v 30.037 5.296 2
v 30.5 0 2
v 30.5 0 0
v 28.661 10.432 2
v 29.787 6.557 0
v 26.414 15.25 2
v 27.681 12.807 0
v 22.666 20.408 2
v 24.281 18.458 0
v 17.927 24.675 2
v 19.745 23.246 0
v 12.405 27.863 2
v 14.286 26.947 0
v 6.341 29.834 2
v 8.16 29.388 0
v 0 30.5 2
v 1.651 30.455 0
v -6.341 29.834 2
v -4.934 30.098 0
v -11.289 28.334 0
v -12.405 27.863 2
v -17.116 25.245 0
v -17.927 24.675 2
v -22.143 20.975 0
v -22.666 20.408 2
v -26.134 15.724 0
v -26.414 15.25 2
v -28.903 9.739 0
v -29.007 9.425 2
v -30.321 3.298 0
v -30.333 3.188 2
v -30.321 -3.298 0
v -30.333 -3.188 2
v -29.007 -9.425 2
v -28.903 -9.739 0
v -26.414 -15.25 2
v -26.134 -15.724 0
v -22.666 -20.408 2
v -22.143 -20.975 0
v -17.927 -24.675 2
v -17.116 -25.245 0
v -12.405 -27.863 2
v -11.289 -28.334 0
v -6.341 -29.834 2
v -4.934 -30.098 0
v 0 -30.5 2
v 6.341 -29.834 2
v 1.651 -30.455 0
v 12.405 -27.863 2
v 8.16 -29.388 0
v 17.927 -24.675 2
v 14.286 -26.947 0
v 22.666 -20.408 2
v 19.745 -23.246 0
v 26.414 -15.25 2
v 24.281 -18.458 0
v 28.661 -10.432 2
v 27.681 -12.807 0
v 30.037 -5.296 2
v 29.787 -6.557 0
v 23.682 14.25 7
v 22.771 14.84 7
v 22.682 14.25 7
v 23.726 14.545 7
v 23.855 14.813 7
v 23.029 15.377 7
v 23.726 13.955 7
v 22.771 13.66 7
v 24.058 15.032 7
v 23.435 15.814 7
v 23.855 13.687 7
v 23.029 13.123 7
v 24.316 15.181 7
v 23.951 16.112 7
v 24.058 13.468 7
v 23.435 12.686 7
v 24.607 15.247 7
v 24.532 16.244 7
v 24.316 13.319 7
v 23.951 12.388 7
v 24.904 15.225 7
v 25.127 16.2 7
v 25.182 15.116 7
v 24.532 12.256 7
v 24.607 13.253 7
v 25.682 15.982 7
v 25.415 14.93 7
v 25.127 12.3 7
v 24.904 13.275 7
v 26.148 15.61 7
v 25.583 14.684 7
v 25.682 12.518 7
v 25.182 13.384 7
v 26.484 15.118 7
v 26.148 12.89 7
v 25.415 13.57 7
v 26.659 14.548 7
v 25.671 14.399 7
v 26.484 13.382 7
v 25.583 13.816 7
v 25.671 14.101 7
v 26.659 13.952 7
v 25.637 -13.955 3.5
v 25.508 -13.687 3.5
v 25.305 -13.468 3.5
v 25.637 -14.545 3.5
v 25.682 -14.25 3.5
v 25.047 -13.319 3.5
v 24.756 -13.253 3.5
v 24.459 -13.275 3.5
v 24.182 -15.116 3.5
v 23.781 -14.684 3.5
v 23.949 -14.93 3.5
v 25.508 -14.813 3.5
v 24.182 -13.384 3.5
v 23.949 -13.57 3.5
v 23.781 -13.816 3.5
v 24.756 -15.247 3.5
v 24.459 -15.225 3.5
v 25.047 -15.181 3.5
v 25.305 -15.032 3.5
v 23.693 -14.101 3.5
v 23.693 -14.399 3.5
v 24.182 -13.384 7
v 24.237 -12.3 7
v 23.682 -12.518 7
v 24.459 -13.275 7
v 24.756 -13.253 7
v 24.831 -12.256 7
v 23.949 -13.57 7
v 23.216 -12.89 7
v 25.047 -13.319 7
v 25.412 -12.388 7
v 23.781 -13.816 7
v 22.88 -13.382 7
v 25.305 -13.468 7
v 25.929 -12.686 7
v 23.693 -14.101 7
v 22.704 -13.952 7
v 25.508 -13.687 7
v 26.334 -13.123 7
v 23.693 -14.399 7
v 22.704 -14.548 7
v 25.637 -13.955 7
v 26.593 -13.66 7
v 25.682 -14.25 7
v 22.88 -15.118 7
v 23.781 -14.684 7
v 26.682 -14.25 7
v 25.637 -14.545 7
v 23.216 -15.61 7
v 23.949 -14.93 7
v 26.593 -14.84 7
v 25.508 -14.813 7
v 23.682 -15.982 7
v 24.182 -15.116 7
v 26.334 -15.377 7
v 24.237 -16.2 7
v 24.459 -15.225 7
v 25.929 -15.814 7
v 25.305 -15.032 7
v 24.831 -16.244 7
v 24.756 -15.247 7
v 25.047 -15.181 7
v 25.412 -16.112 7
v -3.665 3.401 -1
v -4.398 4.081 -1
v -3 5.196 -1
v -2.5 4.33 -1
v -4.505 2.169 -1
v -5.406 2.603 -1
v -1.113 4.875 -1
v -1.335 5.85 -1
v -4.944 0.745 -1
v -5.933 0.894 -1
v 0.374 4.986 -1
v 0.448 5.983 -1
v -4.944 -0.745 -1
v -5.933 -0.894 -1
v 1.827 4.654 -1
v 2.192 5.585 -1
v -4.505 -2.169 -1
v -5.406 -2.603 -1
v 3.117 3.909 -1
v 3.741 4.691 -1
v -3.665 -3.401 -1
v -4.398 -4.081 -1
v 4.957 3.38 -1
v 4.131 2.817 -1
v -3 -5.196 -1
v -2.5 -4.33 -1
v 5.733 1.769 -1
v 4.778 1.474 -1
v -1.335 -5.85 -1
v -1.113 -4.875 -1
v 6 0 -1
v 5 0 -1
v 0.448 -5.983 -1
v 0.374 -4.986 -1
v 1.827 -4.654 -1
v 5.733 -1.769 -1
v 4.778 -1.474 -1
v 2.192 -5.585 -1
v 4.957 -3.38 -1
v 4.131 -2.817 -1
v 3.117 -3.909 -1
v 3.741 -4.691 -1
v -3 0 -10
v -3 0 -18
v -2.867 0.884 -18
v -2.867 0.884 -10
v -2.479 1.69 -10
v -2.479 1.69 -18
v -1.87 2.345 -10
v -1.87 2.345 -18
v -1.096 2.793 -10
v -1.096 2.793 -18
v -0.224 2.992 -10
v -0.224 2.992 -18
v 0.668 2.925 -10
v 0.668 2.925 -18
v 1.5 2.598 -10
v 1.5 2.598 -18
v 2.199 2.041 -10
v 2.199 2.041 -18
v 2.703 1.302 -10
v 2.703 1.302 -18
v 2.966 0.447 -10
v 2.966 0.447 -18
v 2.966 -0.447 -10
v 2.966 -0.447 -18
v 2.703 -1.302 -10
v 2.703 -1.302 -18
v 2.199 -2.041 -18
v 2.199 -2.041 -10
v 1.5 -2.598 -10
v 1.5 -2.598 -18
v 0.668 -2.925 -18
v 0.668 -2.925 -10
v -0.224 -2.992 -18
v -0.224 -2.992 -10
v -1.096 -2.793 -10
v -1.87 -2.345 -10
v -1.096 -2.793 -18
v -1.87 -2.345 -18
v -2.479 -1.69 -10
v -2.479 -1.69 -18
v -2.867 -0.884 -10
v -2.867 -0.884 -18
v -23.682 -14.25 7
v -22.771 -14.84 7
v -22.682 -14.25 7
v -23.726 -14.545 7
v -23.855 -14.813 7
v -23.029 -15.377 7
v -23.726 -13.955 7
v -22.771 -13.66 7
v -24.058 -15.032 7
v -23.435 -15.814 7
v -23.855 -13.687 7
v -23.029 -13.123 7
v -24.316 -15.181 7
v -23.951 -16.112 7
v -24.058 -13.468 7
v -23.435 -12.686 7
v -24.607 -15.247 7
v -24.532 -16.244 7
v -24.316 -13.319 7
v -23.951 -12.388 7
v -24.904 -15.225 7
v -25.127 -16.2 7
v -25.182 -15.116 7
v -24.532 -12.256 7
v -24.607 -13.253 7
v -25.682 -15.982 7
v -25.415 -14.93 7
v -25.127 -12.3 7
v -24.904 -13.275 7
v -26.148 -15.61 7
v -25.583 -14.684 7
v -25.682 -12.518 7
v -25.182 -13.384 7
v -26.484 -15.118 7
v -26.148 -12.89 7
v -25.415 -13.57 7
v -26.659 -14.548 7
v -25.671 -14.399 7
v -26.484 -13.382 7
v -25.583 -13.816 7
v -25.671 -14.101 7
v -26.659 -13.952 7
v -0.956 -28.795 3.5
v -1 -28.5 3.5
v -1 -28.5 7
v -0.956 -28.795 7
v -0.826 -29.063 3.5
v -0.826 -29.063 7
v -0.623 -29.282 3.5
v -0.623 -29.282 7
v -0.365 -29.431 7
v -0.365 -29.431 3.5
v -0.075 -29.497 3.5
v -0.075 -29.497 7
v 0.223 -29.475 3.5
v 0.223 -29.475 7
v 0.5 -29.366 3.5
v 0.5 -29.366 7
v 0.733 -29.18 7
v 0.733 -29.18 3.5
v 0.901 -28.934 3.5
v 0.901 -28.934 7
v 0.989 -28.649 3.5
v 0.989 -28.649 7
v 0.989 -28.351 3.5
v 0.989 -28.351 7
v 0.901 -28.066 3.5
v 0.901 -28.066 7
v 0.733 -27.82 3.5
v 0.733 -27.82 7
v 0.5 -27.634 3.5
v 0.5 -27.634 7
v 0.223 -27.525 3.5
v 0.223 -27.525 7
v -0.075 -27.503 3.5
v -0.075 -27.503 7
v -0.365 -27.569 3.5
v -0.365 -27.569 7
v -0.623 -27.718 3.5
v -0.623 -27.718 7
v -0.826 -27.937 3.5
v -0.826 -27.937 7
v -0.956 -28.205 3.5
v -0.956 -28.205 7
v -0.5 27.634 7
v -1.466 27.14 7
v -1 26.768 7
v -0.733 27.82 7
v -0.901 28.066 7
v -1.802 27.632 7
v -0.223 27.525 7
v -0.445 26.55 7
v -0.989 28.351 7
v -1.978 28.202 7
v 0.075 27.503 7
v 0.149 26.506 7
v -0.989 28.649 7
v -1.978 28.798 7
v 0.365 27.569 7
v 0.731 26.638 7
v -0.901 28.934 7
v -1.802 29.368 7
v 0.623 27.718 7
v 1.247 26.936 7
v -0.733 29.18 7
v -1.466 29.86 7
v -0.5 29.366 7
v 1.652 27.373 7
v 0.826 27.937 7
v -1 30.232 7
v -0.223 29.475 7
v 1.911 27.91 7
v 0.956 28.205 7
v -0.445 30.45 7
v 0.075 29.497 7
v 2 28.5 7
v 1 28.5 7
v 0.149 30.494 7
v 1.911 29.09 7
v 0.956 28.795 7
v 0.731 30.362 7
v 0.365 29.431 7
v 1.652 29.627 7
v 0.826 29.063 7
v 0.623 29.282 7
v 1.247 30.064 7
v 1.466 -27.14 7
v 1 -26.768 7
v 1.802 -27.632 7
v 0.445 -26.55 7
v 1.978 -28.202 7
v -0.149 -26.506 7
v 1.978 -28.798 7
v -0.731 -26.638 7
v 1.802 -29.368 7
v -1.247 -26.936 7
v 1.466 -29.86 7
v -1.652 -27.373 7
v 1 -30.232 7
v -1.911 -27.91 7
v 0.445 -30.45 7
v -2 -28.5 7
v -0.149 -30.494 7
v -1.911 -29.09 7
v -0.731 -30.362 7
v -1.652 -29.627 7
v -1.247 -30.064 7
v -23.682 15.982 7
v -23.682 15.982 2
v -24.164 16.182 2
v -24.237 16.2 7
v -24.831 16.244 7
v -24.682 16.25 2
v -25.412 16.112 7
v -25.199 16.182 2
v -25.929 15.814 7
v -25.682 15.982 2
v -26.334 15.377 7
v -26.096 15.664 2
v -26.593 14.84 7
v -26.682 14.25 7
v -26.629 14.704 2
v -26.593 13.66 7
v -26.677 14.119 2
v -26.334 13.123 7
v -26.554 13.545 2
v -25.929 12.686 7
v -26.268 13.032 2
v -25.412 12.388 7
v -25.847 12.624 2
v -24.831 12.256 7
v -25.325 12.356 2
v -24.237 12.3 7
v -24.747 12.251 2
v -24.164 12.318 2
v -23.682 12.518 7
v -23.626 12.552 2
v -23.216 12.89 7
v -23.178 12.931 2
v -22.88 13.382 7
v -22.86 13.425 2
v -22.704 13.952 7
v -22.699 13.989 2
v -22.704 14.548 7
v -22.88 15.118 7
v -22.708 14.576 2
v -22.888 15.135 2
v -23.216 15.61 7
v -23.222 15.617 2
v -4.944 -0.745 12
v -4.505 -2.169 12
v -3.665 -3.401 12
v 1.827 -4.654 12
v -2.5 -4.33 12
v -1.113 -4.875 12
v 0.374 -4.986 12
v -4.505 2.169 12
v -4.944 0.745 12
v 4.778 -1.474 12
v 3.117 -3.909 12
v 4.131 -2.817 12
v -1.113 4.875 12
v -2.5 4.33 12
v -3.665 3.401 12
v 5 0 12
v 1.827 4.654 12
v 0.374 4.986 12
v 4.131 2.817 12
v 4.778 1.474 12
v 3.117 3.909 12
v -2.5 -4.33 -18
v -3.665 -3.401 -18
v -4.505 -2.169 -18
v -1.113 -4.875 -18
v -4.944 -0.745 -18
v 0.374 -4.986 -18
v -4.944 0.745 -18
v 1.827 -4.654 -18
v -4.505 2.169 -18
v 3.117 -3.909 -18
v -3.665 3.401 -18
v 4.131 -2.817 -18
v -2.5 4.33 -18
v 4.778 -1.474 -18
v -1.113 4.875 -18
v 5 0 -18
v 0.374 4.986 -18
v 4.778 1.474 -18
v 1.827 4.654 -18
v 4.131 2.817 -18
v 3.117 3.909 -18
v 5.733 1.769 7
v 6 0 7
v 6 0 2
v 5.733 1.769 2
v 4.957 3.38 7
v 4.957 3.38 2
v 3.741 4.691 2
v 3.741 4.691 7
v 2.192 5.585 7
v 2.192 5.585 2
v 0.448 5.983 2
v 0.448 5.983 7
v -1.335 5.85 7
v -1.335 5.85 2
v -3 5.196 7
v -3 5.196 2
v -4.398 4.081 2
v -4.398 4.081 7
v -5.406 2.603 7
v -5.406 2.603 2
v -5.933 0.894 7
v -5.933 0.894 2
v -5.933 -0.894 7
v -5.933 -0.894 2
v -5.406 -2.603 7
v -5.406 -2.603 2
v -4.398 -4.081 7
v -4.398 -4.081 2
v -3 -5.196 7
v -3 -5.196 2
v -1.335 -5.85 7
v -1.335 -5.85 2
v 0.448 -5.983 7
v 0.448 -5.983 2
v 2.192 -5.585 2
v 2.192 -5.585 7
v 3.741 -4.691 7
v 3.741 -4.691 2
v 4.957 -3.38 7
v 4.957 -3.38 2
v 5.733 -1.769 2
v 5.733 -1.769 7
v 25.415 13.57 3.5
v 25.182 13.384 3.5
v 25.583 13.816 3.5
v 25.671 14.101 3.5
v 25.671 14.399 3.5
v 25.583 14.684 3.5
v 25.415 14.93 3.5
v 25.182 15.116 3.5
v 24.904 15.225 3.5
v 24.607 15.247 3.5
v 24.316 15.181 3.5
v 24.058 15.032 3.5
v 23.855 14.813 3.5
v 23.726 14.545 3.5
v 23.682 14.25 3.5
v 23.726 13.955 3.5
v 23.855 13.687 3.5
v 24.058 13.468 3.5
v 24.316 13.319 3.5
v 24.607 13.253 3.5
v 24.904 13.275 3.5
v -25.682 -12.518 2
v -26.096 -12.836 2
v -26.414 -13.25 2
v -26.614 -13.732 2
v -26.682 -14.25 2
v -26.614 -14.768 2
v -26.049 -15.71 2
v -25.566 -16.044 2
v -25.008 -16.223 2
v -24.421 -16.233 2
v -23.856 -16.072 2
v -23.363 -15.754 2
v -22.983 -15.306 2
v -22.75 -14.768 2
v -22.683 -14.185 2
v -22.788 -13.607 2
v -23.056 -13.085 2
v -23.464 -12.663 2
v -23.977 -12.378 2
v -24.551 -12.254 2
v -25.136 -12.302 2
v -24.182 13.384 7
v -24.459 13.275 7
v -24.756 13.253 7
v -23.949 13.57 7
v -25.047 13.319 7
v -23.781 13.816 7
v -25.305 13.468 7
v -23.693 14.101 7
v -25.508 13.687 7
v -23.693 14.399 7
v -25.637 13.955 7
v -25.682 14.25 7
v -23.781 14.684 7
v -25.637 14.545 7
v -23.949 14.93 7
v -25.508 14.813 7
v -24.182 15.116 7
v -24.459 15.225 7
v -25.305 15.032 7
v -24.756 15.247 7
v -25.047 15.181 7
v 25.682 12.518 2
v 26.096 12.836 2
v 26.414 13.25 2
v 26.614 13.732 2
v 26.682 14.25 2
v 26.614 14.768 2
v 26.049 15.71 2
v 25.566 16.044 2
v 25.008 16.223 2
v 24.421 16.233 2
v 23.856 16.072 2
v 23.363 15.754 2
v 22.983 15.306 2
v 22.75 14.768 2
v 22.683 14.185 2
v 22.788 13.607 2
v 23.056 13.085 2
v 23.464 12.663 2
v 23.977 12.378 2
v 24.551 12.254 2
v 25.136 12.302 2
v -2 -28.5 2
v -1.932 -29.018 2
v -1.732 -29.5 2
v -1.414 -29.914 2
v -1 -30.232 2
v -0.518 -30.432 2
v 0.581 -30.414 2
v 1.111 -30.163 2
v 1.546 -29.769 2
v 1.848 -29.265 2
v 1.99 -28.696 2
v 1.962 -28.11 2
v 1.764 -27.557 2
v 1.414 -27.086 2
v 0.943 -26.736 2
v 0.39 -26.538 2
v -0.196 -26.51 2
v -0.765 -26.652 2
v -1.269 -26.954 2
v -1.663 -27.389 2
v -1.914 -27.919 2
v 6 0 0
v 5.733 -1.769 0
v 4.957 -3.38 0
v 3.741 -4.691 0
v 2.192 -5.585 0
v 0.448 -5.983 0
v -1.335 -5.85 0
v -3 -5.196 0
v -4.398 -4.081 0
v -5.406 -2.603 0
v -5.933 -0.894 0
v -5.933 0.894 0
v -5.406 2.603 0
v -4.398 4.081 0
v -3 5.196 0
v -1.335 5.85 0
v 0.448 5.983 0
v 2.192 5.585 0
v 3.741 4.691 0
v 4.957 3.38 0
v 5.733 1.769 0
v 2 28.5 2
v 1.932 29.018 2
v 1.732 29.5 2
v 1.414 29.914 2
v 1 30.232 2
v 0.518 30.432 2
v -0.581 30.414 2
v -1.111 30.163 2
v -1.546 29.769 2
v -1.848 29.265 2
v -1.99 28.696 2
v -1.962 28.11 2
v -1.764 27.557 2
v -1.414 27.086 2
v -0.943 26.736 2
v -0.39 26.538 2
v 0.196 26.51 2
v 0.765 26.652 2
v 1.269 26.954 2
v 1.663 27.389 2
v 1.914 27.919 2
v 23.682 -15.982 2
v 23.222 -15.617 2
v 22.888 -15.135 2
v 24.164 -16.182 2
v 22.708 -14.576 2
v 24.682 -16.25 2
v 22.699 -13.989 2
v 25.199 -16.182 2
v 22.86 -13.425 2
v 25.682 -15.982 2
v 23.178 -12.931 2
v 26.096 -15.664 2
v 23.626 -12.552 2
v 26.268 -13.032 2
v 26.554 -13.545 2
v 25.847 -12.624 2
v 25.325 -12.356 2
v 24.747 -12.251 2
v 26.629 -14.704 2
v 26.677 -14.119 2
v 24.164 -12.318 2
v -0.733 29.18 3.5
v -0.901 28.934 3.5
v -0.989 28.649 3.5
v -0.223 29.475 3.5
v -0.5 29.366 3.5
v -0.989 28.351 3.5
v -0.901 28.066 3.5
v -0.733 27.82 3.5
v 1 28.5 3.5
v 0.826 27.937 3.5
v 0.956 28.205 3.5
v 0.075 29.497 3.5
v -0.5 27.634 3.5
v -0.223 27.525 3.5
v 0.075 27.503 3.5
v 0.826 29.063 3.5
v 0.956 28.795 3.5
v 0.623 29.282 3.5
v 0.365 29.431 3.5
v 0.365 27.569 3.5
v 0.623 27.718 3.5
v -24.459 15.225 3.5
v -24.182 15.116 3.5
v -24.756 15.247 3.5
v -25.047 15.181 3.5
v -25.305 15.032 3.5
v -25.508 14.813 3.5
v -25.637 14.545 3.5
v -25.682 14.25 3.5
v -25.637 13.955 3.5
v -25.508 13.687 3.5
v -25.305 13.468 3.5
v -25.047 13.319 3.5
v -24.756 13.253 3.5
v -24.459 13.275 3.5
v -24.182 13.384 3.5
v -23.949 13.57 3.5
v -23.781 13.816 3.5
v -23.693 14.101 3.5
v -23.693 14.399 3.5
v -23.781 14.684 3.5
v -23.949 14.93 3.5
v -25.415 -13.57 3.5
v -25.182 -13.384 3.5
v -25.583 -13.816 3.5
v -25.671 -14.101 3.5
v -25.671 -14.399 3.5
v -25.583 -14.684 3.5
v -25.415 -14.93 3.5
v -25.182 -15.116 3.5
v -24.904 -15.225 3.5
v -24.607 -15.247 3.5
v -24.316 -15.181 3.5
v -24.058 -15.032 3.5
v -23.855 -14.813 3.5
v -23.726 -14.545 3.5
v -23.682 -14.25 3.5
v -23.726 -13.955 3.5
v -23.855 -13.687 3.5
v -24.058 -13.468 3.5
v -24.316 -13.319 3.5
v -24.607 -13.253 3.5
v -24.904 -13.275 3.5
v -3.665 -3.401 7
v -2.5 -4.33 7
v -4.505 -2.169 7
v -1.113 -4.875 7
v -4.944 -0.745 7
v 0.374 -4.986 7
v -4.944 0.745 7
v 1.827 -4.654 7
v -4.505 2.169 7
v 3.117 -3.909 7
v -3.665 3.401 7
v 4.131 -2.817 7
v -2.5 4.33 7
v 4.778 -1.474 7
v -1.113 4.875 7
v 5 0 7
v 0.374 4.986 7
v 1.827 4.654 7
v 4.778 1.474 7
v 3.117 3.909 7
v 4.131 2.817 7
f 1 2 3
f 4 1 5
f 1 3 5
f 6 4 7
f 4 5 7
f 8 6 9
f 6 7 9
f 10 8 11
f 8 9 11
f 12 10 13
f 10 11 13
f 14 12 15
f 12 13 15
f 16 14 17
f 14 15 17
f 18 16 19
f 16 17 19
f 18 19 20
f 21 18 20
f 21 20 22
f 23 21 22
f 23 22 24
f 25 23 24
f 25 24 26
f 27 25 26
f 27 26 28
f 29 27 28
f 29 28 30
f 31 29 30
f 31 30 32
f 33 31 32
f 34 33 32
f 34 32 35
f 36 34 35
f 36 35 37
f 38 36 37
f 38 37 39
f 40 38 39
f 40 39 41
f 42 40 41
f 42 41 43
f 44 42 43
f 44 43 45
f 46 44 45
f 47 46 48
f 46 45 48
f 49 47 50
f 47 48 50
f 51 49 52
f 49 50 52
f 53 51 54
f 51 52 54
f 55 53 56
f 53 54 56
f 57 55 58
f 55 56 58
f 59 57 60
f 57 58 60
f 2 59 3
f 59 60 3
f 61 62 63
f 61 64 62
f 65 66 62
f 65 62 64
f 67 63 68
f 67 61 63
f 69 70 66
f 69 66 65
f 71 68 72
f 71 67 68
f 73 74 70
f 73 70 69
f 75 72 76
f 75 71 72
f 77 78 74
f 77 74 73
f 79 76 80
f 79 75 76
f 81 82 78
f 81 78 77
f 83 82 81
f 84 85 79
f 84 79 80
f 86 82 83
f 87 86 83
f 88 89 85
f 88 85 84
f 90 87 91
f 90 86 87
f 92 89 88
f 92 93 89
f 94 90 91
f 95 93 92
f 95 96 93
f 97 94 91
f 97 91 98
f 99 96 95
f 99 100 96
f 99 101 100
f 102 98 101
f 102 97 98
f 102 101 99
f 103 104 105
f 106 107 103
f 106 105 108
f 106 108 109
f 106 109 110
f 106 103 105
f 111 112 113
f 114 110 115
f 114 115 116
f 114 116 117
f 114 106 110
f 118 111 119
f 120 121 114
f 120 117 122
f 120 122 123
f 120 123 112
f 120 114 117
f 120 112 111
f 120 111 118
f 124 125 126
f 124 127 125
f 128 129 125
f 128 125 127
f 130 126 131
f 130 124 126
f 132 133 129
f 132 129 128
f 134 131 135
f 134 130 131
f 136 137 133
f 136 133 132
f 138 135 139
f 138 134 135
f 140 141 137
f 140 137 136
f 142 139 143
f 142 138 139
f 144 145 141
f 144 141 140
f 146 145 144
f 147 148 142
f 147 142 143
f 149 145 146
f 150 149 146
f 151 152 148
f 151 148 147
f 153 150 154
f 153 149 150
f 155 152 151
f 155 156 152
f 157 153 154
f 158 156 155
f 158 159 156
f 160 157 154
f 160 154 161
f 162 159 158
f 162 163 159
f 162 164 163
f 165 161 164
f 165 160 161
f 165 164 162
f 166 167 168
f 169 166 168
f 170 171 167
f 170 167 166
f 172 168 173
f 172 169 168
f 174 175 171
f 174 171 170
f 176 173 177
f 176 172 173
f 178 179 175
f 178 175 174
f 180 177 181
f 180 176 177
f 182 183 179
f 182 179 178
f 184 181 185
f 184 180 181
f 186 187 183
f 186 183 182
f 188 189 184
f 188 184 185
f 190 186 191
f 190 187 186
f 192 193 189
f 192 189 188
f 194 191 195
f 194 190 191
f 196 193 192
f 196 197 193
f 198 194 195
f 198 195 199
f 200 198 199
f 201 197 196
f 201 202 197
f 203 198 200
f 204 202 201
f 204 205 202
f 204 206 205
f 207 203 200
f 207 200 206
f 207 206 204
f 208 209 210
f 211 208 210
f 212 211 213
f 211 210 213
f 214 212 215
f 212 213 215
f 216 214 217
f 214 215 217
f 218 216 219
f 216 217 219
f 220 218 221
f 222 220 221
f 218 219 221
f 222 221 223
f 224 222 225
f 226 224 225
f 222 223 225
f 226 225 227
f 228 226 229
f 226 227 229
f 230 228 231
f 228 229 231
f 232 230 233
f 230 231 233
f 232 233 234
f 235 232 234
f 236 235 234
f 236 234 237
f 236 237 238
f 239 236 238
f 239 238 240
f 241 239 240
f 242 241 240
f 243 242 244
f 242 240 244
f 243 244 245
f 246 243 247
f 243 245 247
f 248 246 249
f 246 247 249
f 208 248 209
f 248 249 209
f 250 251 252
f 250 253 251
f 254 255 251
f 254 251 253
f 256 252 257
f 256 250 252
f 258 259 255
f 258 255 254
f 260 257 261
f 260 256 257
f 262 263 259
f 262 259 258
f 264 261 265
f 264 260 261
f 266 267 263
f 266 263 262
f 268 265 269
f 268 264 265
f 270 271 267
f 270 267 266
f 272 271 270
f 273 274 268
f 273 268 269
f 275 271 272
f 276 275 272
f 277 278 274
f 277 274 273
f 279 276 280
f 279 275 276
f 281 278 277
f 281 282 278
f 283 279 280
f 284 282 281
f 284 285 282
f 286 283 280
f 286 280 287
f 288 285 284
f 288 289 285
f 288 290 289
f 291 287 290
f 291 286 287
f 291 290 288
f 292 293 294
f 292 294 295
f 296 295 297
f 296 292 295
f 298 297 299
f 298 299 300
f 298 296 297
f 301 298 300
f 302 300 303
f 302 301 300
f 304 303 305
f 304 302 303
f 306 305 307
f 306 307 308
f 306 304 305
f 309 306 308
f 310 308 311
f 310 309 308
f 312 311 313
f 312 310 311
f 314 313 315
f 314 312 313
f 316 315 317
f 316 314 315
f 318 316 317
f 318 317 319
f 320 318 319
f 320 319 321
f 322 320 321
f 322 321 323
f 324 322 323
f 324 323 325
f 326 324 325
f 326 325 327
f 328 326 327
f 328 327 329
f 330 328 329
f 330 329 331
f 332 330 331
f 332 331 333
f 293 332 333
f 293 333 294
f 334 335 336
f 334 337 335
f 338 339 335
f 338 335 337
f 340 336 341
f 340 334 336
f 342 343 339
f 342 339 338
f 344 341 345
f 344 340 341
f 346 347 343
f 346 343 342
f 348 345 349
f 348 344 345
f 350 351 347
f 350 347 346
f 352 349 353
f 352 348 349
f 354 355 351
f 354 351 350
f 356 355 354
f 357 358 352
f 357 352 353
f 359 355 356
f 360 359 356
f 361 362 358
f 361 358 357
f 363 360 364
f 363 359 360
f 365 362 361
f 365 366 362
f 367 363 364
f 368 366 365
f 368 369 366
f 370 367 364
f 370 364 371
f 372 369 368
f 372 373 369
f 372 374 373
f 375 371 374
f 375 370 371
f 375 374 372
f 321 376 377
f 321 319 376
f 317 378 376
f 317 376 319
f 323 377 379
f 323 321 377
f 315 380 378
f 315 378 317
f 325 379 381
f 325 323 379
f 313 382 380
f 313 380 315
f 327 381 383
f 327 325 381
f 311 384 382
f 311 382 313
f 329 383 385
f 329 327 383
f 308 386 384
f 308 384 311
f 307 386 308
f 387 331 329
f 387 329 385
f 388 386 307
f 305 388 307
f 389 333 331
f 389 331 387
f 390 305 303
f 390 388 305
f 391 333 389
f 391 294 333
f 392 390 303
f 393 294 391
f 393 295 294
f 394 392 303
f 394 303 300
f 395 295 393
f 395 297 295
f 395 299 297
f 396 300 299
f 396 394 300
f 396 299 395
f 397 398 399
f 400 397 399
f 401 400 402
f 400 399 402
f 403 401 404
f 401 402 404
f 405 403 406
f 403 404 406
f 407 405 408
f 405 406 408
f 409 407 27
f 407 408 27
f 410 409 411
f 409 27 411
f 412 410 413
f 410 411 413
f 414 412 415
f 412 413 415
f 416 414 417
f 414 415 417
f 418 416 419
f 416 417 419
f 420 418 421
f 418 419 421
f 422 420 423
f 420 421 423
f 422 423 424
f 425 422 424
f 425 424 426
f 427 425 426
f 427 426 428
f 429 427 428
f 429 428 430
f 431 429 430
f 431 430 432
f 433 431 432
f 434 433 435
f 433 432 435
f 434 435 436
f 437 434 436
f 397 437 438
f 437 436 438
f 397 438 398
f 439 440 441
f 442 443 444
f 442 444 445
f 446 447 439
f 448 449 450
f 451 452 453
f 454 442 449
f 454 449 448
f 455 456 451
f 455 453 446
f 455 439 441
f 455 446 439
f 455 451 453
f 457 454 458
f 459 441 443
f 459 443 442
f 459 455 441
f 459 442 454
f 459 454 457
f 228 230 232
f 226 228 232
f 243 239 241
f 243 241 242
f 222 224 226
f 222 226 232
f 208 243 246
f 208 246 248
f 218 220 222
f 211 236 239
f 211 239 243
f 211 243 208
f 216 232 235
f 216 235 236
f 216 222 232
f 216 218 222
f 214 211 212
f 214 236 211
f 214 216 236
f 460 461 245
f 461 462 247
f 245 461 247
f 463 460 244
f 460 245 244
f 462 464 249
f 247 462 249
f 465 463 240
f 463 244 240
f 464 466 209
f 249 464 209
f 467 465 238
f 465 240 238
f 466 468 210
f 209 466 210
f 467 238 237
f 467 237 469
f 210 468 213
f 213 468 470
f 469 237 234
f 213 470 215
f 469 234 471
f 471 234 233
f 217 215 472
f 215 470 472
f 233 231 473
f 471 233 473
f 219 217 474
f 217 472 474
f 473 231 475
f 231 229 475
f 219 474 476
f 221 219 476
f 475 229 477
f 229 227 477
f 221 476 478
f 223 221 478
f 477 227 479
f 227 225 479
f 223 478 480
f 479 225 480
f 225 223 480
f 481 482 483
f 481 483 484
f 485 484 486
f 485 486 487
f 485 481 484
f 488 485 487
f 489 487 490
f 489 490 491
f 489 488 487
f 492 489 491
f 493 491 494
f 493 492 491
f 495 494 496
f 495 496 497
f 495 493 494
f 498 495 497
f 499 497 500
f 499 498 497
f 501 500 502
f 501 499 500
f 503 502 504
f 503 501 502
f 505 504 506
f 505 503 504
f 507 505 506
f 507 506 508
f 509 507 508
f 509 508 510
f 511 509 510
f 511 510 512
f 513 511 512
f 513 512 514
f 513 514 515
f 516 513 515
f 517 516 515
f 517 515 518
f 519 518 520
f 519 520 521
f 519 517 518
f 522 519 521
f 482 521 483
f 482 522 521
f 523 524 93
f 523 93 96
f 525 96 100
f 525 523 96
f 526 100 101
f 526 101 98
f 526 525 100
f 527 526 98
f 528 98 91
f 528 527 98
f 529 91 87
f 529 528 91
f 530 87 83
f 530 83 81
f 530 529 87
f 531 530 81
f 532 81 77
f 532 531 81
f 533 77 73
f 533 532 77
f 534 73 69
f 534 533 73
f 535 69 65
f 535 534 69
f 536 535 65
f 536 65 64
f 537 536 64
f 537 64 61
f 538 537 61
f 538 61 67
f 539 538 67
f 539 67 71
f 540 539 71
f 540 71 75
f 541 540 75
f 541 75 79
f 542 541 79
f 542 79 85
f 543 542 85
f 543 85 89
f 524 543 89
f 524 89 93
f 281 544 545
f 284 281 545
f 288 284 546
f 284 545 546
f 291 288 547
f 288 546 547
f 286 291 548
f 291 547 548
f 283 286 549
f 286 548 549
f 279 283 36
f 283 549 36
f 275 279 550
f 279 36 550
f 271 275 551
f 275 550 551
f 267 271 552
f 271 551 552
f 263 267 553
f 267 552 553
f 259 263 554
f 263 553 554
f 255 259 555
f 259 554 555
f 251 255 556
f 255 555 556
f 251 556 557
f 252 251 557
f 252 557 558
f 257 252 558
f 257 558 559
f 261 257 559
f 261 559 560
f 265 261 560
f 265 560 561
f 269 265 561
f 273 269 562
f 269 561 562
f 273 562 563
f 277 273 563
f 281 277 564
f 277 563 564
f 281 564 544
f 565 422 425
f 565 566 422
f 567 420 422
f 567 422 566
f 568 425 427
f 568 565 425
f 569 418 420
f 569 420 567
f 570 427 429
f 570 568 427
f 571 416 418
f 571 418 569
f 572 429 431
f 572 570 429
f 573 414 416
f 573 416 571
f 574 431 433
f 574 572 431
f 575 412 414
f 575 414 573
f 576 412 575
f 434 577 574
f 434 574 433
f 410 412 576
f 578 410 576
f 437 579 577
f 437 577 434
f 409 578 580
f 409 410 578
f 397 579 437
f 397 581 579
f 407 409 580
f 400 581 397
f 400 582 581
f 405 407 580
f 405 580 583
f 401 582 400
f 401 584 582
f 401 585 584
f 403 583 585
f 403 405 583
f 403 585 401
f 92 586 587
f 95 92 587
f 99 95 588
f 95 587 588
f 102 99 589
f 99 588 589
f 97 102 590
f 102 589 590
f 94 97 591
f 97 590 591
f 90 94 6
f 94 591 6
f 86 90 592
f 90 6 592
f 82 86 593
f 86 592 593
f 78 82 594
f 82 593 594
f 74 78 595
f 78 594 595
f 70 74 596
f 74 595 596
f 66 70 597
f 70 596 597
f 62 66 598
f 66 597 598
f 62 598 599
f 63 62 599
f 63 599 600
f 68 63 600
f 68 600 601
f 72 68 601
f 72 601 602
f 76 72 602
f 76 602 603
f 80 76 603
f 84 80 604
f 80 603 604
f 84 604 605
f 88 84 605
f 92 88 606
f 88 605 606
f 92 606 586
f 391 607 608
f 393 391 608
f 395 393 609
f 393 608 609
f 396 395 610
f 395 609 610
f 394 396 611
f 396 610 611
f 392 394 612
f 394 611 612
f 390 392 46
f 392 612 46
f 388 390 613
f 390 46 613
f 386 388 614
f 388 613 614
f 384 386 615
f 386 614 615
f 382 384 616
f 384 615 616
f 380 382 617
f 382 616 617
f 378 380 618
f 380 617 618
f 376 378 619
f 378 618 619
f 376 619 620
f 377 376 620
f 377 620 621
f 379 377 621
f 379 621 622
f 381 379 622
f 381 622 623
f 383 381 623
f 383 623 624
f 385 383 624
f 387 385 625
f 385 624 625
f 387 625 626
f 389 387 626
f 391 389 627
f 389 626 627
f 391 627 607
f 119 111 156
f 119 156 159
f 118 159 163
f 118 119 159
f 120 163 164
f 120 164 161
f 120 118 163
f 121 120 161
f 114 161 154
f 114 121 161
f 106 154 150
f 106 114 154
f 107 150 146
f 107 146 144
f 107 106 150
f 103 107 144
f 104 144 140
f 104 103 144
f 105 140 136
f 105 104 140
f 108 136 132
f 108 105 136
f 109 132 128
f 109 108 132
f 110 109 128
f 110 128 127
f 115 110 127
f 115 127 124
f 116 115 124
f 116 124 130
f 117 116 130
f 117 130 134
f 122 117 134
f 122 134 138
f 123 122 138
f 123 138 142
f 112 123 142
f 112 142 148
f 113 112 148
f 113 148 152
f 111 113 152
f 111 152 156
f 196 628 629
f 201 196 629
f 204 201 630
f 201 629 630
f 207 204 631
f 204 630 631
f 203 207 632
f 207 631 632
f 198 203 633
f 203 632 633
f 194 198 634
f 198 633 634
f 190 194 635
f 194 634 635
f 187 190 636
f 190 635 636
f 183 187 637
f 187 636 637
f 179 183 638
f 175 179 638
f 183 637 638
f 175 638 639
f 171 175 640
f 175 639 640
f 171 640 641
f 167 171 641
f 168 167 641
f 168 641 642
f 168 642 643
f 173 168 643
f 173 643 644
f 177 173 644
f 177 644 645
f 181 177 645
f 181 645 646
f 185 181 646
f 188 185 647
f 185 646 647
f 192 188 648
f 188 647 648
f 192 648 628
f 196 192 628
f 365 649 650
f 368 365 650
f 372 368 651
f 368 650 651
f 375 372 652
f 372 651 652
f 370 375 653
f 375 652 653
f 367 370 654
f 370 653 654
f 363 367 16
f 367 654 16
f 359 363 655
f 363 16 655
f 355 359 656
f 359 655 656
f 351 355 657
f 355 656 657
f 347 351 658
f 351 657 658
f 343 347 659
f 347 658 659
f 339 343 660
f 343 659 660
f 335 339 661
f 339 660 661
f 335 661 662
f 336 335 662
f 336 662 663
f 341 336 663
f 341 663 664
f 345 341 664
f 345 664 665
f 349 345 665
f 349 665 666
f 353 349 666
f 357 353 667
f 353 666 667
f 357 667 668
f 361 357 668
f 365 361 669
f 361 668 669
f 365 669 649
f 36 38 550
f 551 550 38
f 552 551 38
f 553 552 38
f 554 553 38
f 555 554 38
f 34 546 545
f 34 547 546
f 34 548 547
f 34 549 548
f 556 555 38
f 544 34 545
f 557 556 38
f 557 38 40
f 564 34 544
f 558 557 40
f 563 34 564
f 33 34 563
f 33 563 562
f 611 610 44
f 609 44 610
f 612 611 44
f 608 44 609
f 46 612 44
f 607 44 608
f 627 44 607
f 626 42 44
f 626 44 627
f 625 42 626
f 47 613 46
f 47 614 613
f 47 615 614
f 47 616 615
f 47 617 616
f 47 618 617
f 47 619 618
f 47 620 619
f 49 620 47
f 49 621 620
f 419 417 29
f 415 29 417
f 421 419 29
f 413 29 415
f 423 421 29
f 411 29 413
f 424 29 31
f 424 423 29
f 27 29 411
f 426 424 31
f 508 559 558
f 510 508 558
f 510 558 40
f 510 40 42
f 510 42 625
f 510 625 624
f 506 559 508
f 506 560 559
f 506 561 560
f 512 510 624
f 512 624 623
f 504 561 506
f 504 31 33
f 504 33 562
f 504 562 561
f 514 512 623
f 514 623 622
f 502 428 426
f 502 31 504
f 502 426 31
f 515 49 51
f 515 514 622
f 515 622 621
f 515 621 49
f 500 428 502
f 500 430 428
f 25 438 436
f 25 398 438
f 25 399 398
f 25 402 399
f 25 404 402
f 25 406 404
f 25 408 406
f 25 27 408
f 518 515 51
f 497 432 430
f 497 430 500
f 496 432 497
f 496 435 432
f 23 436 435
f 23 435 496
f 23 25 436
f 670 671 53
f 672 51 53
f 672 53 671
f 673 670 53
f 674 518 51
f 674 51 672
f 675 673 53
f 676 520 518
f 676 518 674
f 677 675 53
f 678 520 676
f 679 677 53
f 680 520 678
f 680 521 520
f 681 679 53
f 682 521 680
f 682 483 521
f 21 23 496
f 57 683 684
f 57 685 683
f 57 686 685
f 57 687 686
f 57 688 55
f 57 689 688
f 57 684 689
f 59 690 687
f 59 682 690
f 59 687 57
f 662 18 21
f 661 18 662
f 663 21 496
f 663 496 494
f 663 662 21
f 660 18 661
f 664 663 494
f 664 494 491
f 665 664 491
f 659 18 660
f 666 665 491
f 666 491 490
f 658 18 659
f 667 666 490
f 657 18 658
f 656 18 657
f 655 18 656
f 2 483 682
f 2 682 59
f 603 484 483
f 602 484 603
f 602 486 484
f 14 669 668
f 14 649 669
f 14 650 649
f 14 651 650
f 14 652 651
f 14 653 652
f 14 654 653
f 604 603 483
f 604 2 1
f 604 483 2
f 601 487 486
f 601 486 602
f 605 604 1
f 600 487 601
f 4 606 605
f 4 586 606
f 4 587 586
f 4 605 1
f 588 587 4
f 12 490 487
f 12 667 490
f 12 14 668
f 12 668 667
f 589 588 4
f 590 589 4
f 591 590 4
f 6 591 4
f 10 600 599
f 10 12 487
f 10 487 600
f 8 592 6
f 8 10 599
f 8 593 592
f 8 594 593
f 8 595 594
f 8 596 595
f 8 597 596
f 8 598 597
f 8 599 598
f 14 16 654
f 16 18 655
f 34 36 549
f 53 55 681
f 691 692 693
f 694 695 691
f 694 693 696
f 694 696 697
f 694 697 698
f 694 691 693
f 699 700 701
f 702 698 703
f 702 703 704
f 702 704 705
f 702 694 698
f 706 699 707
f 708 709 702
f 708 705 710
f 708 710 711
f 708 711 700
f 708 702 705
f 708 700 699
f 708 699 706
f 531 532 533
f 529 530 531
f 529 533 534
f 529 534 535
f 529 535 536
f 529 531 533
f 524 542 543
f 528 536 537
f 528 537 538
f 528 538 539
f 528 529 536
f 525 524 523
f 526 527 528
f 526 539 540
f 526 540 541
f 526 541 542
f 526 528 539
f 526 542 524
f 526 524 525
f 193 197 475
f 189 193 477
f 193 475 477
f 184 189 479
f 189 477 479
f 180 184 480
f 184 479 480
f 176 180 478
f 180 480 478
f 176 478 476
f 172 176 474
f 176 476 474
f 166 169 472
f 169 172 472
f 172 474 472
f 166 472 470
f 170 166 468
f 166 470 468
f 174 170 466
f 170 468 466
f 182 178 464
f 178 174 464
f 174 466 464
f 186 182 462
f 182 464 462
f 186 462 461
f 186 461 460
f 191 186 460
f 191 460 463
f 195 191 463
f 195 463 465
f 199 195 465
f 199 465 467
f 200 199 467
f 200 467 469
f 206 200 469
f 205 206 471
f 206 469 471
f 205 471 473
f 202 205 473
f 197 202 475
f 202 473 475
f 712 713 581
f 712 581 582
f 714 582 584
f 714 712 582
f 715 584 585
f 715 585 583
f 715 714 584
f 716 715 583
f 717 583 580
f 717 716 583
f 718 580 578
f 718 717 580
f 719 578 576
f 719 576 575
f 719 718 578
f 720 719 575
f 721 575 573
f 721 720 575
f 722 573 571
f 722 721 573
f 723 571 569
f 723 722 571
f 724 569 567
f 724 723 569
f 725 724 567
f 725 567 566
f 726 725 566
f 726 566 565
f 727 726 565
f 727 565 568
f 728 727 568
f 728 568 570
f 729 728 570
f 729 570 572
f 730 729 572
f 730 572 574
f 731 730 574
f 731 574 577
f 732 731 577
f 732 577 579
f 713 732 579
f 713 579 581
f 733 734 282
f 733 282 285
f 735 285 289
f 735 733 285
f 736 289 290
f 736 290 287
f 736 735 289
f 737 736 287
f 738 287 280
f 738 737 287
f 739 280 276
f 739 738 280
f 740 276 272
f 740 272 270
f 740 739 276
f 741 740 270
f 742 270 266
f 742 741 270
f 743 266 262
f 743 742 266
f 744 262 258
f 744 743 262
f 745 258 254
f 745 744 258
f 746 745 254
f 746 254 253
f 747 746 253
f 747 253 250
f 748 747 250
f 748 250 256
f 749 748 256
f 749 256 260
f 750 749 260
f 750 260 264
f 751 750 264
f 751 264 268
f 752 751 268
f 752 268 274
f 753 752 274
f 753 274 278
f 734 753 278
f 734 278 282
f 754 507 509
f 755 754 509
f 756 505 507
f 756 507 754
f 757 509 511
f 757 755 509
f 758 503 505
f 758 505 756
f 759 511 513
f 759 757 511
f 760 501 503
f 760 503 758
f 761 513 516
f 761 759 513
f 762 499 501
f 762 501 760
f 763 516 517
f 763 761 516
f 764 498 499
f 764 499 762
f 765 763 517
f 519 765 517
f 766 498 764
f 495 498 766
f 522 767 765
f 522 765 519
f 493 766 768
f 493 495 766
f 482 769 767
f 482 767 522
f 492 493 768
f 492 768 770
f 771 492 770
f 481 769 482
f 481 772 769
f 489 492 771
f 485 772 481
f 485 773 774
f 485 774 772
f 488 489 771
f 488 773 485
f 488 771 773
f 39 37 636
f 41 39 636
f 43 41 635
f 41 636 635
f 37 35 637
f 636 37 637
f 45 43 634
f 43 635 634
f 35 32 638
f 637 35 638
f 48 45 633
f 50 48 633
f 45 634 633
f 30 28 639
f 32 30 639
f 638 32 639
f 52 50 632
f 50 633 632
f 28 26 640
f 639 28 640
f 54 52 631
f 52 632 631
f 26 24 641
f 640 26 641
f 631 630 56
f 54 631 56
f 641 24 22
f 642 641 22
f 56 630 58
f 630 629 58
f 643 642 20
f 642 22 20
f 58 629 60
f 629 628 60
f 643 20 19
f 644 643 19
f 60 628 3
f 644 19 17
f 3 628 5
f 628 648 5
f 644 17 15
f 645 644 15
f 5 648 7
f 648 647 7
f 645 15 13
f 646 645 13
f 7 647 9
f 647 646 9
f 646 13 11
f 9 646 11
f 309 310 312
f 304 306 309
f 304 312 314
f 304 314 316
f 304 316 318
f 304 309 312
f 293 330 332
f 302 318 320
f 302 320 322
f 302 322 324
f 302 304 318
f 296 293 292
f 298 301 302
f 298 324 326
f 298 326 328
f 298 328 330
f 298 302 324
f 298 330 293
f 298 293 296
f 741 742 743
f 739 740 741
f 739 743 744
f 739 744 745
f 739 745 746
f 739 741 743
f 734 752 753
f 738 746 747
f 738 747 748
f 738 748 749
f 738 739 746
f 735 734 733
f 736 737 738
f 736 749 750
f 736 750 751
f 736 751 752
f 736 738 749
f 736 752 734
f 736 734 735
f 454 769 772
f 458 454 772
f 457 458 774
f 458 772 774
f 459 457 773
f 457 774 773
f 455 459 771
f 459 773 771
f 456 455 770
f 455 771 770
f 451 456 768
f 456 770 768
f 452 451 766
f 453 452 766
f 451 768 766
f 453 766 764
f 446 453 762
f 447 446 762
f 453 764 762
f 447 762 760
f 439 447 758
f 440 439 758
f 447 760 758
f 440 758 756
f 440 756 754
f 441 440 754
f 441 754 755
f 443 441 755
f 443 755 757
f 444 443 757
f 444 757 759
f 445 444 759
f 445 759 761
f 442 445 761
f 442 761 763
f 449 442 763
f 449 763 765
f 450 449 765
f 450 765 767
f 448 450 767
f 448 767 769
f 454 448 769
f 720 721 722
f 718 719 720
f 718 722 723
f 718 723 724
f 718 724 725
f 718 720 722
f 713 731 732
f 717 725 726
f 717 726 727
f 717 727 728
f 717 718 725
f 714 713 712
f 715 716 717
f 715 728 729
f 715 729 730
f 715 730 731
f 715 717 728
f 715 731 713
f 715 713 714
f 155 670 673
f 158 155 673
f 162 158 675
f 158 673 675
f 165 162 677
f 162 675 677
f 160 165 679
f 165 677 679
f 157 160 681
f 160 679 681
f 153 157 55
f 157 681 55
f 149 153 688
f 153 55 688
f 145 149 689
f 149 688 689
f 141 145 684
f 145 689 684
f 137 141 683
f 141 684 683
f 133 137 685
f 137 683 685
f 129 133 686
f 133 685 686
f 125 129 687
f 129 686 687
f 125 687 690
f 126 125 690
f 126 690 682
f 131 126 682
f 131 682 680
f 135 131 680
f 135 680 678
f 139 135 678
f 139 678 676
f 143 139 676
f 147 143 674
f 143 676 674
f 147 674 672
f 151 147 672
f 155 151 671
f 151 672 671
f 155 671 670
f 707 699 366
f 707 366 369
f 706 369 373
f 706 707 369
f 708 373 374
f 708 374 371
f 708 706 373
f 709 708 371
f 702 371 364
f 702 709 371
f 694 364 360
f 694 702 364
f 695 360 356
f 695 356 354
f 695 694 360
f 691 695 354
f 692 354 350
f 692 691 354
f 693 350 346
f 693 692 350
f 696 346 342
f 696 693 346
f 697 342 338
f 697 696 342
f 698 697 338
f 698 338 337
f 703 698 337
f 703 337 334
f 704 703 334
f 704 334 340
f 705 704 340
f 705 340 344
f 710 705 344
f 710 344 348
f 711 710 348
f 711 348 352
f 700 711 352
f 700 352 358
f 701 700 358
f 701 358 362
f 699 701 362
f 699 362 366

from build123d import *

# Parameters (mm, degrees)
SKETCH_1_R               = 30.5
EXTRUDE_1_DEPTH          = 2
SKETCH_2_R               = 1
EXTRUDE_2_DEPTH          = 1.5
PATTERN_CIRCULAR_1_COUNT = 6
EXTRUDE_3_DEPTH          = 10
EXTRUDE_3_DEPTH_BACK     = 20
SKETCH_3_R               = 5
SKETCH_4_R               = 2
SKETCH_4_R_2             = 1
EXTRUDE_1_2_DEPTH        = 5
PATTERN_CIRCULAR_3_COUNT = 6
SKETCH_5_R               = 6
EXTRUDE_5_DEPTH          = 1
EXTRUDE_START            = 5
SKETCH_6_R               = 6
EXTRUDE_6_DEPTH          = 5
SKETCH_7_R               = 3
CUT_EXTRUDE_1_DEPTH      = 8


with BuildPart() as part:
    # 草图1 → Extrude 1 (new body)
    with BuildSketch(Plane.XY):
        Circle(SKETCH_1_R)
    extrude(amount=EXTRUDE_1_DEPTH)

    # 草图2 → 凸台-拉伸2 (add)
    with BuildSketch(Plane.XY.offset(2)):
        with Locations((0, 28.5)):
            Circle(SKETCH_2_R)
    extrude_2 = extrude(amount=EXTRUDE_2_DEPTH)

    # 阵列(圆周)1: 凸台-拉伸2 ×6 about axis
    pattern_circular_1_axis = Axis((0, 0, 0), (0, 0, 1))
    for i in range(1, PATTERN_CIRCULAR_1_COUNT):
        add(extrude_2.rotate(pattern_circular_1_axis, i * 360 / PATTERN_CIRCULAR_1_COUNT))

    # 草图3 → 凸台-拉伸3 (add, two sides: drawn at the far end of the back side and taken through both)
    with BuildSketch(Plane.XY.offset(2).offset(-EXTRUDE_3_DEPTH_BACK)):
        Circle(SKETCH_3_R)
    extrude(amount=EXTRUDE_3_DEPTH + EXTRUDE_3_DEPTH_BACK)

    # 草图4 → Extrude 1 2 (add)
    with BuildSketch(Plane.XY.offset(2)):
        with Locations((0, 28.5)):
            Circle(SKETCH_4_R)
        with Locations((0, 28.5)):
            Circle(SKETCH_4_R_2, mode=Mode.SUBTRACT)
    extrude_1_2 = extrude(amount=EXTRUDE_1_2_DEPTH)

    # 阵列(圆周)3: Extrude 1 2 ×6 about axis
    pattern_circular_3_axis = Axis((0, 0, 0), (0, 0, 1))
    for i in range(1, PATTERN_CIRCULAR_3_COUNT):
        add(extrude_1_2.rotate(pattern_circular_3_axis, i * 360 / PATTERN_CIRCULAR_3_COUNT))

    # 草图5 → 凸台-拉伸5 (add)
    with BuildSketch(Plane(origin=(0, 0, 0), x_dir=(-1, 0, 0), z_dir=(0, 0, -1))):
        with Locations(Location((0, 0, 0), (0, 0, 180))):
            Circle(SKETCH_5_R)
    extrude(amount=EXTRUDE_5_DEPTH)

    # 草图6 → 凸台-拉伸6 (add)
    with BuildSketch(Plane.XY.offset(2).offset(EXTRUDE_START)):
        Circle(SKETCH_6_R)
    extrude(amount=-EXTRUDE_6_DEPTH)

    # 草图7 → 切除-拉伸1 (cut)
    with BuildSketch(Plane(origin=(0, 0, -18), x_dir=(-1, 0, 0), z_dir=(0, 0, -1))):
        Circle(SKETCH_7_R)
    extrude(amount=-CUT_EXTRUDE_1_DEPTH, mode=Mode.SUBTRACT)


solid = part.part
